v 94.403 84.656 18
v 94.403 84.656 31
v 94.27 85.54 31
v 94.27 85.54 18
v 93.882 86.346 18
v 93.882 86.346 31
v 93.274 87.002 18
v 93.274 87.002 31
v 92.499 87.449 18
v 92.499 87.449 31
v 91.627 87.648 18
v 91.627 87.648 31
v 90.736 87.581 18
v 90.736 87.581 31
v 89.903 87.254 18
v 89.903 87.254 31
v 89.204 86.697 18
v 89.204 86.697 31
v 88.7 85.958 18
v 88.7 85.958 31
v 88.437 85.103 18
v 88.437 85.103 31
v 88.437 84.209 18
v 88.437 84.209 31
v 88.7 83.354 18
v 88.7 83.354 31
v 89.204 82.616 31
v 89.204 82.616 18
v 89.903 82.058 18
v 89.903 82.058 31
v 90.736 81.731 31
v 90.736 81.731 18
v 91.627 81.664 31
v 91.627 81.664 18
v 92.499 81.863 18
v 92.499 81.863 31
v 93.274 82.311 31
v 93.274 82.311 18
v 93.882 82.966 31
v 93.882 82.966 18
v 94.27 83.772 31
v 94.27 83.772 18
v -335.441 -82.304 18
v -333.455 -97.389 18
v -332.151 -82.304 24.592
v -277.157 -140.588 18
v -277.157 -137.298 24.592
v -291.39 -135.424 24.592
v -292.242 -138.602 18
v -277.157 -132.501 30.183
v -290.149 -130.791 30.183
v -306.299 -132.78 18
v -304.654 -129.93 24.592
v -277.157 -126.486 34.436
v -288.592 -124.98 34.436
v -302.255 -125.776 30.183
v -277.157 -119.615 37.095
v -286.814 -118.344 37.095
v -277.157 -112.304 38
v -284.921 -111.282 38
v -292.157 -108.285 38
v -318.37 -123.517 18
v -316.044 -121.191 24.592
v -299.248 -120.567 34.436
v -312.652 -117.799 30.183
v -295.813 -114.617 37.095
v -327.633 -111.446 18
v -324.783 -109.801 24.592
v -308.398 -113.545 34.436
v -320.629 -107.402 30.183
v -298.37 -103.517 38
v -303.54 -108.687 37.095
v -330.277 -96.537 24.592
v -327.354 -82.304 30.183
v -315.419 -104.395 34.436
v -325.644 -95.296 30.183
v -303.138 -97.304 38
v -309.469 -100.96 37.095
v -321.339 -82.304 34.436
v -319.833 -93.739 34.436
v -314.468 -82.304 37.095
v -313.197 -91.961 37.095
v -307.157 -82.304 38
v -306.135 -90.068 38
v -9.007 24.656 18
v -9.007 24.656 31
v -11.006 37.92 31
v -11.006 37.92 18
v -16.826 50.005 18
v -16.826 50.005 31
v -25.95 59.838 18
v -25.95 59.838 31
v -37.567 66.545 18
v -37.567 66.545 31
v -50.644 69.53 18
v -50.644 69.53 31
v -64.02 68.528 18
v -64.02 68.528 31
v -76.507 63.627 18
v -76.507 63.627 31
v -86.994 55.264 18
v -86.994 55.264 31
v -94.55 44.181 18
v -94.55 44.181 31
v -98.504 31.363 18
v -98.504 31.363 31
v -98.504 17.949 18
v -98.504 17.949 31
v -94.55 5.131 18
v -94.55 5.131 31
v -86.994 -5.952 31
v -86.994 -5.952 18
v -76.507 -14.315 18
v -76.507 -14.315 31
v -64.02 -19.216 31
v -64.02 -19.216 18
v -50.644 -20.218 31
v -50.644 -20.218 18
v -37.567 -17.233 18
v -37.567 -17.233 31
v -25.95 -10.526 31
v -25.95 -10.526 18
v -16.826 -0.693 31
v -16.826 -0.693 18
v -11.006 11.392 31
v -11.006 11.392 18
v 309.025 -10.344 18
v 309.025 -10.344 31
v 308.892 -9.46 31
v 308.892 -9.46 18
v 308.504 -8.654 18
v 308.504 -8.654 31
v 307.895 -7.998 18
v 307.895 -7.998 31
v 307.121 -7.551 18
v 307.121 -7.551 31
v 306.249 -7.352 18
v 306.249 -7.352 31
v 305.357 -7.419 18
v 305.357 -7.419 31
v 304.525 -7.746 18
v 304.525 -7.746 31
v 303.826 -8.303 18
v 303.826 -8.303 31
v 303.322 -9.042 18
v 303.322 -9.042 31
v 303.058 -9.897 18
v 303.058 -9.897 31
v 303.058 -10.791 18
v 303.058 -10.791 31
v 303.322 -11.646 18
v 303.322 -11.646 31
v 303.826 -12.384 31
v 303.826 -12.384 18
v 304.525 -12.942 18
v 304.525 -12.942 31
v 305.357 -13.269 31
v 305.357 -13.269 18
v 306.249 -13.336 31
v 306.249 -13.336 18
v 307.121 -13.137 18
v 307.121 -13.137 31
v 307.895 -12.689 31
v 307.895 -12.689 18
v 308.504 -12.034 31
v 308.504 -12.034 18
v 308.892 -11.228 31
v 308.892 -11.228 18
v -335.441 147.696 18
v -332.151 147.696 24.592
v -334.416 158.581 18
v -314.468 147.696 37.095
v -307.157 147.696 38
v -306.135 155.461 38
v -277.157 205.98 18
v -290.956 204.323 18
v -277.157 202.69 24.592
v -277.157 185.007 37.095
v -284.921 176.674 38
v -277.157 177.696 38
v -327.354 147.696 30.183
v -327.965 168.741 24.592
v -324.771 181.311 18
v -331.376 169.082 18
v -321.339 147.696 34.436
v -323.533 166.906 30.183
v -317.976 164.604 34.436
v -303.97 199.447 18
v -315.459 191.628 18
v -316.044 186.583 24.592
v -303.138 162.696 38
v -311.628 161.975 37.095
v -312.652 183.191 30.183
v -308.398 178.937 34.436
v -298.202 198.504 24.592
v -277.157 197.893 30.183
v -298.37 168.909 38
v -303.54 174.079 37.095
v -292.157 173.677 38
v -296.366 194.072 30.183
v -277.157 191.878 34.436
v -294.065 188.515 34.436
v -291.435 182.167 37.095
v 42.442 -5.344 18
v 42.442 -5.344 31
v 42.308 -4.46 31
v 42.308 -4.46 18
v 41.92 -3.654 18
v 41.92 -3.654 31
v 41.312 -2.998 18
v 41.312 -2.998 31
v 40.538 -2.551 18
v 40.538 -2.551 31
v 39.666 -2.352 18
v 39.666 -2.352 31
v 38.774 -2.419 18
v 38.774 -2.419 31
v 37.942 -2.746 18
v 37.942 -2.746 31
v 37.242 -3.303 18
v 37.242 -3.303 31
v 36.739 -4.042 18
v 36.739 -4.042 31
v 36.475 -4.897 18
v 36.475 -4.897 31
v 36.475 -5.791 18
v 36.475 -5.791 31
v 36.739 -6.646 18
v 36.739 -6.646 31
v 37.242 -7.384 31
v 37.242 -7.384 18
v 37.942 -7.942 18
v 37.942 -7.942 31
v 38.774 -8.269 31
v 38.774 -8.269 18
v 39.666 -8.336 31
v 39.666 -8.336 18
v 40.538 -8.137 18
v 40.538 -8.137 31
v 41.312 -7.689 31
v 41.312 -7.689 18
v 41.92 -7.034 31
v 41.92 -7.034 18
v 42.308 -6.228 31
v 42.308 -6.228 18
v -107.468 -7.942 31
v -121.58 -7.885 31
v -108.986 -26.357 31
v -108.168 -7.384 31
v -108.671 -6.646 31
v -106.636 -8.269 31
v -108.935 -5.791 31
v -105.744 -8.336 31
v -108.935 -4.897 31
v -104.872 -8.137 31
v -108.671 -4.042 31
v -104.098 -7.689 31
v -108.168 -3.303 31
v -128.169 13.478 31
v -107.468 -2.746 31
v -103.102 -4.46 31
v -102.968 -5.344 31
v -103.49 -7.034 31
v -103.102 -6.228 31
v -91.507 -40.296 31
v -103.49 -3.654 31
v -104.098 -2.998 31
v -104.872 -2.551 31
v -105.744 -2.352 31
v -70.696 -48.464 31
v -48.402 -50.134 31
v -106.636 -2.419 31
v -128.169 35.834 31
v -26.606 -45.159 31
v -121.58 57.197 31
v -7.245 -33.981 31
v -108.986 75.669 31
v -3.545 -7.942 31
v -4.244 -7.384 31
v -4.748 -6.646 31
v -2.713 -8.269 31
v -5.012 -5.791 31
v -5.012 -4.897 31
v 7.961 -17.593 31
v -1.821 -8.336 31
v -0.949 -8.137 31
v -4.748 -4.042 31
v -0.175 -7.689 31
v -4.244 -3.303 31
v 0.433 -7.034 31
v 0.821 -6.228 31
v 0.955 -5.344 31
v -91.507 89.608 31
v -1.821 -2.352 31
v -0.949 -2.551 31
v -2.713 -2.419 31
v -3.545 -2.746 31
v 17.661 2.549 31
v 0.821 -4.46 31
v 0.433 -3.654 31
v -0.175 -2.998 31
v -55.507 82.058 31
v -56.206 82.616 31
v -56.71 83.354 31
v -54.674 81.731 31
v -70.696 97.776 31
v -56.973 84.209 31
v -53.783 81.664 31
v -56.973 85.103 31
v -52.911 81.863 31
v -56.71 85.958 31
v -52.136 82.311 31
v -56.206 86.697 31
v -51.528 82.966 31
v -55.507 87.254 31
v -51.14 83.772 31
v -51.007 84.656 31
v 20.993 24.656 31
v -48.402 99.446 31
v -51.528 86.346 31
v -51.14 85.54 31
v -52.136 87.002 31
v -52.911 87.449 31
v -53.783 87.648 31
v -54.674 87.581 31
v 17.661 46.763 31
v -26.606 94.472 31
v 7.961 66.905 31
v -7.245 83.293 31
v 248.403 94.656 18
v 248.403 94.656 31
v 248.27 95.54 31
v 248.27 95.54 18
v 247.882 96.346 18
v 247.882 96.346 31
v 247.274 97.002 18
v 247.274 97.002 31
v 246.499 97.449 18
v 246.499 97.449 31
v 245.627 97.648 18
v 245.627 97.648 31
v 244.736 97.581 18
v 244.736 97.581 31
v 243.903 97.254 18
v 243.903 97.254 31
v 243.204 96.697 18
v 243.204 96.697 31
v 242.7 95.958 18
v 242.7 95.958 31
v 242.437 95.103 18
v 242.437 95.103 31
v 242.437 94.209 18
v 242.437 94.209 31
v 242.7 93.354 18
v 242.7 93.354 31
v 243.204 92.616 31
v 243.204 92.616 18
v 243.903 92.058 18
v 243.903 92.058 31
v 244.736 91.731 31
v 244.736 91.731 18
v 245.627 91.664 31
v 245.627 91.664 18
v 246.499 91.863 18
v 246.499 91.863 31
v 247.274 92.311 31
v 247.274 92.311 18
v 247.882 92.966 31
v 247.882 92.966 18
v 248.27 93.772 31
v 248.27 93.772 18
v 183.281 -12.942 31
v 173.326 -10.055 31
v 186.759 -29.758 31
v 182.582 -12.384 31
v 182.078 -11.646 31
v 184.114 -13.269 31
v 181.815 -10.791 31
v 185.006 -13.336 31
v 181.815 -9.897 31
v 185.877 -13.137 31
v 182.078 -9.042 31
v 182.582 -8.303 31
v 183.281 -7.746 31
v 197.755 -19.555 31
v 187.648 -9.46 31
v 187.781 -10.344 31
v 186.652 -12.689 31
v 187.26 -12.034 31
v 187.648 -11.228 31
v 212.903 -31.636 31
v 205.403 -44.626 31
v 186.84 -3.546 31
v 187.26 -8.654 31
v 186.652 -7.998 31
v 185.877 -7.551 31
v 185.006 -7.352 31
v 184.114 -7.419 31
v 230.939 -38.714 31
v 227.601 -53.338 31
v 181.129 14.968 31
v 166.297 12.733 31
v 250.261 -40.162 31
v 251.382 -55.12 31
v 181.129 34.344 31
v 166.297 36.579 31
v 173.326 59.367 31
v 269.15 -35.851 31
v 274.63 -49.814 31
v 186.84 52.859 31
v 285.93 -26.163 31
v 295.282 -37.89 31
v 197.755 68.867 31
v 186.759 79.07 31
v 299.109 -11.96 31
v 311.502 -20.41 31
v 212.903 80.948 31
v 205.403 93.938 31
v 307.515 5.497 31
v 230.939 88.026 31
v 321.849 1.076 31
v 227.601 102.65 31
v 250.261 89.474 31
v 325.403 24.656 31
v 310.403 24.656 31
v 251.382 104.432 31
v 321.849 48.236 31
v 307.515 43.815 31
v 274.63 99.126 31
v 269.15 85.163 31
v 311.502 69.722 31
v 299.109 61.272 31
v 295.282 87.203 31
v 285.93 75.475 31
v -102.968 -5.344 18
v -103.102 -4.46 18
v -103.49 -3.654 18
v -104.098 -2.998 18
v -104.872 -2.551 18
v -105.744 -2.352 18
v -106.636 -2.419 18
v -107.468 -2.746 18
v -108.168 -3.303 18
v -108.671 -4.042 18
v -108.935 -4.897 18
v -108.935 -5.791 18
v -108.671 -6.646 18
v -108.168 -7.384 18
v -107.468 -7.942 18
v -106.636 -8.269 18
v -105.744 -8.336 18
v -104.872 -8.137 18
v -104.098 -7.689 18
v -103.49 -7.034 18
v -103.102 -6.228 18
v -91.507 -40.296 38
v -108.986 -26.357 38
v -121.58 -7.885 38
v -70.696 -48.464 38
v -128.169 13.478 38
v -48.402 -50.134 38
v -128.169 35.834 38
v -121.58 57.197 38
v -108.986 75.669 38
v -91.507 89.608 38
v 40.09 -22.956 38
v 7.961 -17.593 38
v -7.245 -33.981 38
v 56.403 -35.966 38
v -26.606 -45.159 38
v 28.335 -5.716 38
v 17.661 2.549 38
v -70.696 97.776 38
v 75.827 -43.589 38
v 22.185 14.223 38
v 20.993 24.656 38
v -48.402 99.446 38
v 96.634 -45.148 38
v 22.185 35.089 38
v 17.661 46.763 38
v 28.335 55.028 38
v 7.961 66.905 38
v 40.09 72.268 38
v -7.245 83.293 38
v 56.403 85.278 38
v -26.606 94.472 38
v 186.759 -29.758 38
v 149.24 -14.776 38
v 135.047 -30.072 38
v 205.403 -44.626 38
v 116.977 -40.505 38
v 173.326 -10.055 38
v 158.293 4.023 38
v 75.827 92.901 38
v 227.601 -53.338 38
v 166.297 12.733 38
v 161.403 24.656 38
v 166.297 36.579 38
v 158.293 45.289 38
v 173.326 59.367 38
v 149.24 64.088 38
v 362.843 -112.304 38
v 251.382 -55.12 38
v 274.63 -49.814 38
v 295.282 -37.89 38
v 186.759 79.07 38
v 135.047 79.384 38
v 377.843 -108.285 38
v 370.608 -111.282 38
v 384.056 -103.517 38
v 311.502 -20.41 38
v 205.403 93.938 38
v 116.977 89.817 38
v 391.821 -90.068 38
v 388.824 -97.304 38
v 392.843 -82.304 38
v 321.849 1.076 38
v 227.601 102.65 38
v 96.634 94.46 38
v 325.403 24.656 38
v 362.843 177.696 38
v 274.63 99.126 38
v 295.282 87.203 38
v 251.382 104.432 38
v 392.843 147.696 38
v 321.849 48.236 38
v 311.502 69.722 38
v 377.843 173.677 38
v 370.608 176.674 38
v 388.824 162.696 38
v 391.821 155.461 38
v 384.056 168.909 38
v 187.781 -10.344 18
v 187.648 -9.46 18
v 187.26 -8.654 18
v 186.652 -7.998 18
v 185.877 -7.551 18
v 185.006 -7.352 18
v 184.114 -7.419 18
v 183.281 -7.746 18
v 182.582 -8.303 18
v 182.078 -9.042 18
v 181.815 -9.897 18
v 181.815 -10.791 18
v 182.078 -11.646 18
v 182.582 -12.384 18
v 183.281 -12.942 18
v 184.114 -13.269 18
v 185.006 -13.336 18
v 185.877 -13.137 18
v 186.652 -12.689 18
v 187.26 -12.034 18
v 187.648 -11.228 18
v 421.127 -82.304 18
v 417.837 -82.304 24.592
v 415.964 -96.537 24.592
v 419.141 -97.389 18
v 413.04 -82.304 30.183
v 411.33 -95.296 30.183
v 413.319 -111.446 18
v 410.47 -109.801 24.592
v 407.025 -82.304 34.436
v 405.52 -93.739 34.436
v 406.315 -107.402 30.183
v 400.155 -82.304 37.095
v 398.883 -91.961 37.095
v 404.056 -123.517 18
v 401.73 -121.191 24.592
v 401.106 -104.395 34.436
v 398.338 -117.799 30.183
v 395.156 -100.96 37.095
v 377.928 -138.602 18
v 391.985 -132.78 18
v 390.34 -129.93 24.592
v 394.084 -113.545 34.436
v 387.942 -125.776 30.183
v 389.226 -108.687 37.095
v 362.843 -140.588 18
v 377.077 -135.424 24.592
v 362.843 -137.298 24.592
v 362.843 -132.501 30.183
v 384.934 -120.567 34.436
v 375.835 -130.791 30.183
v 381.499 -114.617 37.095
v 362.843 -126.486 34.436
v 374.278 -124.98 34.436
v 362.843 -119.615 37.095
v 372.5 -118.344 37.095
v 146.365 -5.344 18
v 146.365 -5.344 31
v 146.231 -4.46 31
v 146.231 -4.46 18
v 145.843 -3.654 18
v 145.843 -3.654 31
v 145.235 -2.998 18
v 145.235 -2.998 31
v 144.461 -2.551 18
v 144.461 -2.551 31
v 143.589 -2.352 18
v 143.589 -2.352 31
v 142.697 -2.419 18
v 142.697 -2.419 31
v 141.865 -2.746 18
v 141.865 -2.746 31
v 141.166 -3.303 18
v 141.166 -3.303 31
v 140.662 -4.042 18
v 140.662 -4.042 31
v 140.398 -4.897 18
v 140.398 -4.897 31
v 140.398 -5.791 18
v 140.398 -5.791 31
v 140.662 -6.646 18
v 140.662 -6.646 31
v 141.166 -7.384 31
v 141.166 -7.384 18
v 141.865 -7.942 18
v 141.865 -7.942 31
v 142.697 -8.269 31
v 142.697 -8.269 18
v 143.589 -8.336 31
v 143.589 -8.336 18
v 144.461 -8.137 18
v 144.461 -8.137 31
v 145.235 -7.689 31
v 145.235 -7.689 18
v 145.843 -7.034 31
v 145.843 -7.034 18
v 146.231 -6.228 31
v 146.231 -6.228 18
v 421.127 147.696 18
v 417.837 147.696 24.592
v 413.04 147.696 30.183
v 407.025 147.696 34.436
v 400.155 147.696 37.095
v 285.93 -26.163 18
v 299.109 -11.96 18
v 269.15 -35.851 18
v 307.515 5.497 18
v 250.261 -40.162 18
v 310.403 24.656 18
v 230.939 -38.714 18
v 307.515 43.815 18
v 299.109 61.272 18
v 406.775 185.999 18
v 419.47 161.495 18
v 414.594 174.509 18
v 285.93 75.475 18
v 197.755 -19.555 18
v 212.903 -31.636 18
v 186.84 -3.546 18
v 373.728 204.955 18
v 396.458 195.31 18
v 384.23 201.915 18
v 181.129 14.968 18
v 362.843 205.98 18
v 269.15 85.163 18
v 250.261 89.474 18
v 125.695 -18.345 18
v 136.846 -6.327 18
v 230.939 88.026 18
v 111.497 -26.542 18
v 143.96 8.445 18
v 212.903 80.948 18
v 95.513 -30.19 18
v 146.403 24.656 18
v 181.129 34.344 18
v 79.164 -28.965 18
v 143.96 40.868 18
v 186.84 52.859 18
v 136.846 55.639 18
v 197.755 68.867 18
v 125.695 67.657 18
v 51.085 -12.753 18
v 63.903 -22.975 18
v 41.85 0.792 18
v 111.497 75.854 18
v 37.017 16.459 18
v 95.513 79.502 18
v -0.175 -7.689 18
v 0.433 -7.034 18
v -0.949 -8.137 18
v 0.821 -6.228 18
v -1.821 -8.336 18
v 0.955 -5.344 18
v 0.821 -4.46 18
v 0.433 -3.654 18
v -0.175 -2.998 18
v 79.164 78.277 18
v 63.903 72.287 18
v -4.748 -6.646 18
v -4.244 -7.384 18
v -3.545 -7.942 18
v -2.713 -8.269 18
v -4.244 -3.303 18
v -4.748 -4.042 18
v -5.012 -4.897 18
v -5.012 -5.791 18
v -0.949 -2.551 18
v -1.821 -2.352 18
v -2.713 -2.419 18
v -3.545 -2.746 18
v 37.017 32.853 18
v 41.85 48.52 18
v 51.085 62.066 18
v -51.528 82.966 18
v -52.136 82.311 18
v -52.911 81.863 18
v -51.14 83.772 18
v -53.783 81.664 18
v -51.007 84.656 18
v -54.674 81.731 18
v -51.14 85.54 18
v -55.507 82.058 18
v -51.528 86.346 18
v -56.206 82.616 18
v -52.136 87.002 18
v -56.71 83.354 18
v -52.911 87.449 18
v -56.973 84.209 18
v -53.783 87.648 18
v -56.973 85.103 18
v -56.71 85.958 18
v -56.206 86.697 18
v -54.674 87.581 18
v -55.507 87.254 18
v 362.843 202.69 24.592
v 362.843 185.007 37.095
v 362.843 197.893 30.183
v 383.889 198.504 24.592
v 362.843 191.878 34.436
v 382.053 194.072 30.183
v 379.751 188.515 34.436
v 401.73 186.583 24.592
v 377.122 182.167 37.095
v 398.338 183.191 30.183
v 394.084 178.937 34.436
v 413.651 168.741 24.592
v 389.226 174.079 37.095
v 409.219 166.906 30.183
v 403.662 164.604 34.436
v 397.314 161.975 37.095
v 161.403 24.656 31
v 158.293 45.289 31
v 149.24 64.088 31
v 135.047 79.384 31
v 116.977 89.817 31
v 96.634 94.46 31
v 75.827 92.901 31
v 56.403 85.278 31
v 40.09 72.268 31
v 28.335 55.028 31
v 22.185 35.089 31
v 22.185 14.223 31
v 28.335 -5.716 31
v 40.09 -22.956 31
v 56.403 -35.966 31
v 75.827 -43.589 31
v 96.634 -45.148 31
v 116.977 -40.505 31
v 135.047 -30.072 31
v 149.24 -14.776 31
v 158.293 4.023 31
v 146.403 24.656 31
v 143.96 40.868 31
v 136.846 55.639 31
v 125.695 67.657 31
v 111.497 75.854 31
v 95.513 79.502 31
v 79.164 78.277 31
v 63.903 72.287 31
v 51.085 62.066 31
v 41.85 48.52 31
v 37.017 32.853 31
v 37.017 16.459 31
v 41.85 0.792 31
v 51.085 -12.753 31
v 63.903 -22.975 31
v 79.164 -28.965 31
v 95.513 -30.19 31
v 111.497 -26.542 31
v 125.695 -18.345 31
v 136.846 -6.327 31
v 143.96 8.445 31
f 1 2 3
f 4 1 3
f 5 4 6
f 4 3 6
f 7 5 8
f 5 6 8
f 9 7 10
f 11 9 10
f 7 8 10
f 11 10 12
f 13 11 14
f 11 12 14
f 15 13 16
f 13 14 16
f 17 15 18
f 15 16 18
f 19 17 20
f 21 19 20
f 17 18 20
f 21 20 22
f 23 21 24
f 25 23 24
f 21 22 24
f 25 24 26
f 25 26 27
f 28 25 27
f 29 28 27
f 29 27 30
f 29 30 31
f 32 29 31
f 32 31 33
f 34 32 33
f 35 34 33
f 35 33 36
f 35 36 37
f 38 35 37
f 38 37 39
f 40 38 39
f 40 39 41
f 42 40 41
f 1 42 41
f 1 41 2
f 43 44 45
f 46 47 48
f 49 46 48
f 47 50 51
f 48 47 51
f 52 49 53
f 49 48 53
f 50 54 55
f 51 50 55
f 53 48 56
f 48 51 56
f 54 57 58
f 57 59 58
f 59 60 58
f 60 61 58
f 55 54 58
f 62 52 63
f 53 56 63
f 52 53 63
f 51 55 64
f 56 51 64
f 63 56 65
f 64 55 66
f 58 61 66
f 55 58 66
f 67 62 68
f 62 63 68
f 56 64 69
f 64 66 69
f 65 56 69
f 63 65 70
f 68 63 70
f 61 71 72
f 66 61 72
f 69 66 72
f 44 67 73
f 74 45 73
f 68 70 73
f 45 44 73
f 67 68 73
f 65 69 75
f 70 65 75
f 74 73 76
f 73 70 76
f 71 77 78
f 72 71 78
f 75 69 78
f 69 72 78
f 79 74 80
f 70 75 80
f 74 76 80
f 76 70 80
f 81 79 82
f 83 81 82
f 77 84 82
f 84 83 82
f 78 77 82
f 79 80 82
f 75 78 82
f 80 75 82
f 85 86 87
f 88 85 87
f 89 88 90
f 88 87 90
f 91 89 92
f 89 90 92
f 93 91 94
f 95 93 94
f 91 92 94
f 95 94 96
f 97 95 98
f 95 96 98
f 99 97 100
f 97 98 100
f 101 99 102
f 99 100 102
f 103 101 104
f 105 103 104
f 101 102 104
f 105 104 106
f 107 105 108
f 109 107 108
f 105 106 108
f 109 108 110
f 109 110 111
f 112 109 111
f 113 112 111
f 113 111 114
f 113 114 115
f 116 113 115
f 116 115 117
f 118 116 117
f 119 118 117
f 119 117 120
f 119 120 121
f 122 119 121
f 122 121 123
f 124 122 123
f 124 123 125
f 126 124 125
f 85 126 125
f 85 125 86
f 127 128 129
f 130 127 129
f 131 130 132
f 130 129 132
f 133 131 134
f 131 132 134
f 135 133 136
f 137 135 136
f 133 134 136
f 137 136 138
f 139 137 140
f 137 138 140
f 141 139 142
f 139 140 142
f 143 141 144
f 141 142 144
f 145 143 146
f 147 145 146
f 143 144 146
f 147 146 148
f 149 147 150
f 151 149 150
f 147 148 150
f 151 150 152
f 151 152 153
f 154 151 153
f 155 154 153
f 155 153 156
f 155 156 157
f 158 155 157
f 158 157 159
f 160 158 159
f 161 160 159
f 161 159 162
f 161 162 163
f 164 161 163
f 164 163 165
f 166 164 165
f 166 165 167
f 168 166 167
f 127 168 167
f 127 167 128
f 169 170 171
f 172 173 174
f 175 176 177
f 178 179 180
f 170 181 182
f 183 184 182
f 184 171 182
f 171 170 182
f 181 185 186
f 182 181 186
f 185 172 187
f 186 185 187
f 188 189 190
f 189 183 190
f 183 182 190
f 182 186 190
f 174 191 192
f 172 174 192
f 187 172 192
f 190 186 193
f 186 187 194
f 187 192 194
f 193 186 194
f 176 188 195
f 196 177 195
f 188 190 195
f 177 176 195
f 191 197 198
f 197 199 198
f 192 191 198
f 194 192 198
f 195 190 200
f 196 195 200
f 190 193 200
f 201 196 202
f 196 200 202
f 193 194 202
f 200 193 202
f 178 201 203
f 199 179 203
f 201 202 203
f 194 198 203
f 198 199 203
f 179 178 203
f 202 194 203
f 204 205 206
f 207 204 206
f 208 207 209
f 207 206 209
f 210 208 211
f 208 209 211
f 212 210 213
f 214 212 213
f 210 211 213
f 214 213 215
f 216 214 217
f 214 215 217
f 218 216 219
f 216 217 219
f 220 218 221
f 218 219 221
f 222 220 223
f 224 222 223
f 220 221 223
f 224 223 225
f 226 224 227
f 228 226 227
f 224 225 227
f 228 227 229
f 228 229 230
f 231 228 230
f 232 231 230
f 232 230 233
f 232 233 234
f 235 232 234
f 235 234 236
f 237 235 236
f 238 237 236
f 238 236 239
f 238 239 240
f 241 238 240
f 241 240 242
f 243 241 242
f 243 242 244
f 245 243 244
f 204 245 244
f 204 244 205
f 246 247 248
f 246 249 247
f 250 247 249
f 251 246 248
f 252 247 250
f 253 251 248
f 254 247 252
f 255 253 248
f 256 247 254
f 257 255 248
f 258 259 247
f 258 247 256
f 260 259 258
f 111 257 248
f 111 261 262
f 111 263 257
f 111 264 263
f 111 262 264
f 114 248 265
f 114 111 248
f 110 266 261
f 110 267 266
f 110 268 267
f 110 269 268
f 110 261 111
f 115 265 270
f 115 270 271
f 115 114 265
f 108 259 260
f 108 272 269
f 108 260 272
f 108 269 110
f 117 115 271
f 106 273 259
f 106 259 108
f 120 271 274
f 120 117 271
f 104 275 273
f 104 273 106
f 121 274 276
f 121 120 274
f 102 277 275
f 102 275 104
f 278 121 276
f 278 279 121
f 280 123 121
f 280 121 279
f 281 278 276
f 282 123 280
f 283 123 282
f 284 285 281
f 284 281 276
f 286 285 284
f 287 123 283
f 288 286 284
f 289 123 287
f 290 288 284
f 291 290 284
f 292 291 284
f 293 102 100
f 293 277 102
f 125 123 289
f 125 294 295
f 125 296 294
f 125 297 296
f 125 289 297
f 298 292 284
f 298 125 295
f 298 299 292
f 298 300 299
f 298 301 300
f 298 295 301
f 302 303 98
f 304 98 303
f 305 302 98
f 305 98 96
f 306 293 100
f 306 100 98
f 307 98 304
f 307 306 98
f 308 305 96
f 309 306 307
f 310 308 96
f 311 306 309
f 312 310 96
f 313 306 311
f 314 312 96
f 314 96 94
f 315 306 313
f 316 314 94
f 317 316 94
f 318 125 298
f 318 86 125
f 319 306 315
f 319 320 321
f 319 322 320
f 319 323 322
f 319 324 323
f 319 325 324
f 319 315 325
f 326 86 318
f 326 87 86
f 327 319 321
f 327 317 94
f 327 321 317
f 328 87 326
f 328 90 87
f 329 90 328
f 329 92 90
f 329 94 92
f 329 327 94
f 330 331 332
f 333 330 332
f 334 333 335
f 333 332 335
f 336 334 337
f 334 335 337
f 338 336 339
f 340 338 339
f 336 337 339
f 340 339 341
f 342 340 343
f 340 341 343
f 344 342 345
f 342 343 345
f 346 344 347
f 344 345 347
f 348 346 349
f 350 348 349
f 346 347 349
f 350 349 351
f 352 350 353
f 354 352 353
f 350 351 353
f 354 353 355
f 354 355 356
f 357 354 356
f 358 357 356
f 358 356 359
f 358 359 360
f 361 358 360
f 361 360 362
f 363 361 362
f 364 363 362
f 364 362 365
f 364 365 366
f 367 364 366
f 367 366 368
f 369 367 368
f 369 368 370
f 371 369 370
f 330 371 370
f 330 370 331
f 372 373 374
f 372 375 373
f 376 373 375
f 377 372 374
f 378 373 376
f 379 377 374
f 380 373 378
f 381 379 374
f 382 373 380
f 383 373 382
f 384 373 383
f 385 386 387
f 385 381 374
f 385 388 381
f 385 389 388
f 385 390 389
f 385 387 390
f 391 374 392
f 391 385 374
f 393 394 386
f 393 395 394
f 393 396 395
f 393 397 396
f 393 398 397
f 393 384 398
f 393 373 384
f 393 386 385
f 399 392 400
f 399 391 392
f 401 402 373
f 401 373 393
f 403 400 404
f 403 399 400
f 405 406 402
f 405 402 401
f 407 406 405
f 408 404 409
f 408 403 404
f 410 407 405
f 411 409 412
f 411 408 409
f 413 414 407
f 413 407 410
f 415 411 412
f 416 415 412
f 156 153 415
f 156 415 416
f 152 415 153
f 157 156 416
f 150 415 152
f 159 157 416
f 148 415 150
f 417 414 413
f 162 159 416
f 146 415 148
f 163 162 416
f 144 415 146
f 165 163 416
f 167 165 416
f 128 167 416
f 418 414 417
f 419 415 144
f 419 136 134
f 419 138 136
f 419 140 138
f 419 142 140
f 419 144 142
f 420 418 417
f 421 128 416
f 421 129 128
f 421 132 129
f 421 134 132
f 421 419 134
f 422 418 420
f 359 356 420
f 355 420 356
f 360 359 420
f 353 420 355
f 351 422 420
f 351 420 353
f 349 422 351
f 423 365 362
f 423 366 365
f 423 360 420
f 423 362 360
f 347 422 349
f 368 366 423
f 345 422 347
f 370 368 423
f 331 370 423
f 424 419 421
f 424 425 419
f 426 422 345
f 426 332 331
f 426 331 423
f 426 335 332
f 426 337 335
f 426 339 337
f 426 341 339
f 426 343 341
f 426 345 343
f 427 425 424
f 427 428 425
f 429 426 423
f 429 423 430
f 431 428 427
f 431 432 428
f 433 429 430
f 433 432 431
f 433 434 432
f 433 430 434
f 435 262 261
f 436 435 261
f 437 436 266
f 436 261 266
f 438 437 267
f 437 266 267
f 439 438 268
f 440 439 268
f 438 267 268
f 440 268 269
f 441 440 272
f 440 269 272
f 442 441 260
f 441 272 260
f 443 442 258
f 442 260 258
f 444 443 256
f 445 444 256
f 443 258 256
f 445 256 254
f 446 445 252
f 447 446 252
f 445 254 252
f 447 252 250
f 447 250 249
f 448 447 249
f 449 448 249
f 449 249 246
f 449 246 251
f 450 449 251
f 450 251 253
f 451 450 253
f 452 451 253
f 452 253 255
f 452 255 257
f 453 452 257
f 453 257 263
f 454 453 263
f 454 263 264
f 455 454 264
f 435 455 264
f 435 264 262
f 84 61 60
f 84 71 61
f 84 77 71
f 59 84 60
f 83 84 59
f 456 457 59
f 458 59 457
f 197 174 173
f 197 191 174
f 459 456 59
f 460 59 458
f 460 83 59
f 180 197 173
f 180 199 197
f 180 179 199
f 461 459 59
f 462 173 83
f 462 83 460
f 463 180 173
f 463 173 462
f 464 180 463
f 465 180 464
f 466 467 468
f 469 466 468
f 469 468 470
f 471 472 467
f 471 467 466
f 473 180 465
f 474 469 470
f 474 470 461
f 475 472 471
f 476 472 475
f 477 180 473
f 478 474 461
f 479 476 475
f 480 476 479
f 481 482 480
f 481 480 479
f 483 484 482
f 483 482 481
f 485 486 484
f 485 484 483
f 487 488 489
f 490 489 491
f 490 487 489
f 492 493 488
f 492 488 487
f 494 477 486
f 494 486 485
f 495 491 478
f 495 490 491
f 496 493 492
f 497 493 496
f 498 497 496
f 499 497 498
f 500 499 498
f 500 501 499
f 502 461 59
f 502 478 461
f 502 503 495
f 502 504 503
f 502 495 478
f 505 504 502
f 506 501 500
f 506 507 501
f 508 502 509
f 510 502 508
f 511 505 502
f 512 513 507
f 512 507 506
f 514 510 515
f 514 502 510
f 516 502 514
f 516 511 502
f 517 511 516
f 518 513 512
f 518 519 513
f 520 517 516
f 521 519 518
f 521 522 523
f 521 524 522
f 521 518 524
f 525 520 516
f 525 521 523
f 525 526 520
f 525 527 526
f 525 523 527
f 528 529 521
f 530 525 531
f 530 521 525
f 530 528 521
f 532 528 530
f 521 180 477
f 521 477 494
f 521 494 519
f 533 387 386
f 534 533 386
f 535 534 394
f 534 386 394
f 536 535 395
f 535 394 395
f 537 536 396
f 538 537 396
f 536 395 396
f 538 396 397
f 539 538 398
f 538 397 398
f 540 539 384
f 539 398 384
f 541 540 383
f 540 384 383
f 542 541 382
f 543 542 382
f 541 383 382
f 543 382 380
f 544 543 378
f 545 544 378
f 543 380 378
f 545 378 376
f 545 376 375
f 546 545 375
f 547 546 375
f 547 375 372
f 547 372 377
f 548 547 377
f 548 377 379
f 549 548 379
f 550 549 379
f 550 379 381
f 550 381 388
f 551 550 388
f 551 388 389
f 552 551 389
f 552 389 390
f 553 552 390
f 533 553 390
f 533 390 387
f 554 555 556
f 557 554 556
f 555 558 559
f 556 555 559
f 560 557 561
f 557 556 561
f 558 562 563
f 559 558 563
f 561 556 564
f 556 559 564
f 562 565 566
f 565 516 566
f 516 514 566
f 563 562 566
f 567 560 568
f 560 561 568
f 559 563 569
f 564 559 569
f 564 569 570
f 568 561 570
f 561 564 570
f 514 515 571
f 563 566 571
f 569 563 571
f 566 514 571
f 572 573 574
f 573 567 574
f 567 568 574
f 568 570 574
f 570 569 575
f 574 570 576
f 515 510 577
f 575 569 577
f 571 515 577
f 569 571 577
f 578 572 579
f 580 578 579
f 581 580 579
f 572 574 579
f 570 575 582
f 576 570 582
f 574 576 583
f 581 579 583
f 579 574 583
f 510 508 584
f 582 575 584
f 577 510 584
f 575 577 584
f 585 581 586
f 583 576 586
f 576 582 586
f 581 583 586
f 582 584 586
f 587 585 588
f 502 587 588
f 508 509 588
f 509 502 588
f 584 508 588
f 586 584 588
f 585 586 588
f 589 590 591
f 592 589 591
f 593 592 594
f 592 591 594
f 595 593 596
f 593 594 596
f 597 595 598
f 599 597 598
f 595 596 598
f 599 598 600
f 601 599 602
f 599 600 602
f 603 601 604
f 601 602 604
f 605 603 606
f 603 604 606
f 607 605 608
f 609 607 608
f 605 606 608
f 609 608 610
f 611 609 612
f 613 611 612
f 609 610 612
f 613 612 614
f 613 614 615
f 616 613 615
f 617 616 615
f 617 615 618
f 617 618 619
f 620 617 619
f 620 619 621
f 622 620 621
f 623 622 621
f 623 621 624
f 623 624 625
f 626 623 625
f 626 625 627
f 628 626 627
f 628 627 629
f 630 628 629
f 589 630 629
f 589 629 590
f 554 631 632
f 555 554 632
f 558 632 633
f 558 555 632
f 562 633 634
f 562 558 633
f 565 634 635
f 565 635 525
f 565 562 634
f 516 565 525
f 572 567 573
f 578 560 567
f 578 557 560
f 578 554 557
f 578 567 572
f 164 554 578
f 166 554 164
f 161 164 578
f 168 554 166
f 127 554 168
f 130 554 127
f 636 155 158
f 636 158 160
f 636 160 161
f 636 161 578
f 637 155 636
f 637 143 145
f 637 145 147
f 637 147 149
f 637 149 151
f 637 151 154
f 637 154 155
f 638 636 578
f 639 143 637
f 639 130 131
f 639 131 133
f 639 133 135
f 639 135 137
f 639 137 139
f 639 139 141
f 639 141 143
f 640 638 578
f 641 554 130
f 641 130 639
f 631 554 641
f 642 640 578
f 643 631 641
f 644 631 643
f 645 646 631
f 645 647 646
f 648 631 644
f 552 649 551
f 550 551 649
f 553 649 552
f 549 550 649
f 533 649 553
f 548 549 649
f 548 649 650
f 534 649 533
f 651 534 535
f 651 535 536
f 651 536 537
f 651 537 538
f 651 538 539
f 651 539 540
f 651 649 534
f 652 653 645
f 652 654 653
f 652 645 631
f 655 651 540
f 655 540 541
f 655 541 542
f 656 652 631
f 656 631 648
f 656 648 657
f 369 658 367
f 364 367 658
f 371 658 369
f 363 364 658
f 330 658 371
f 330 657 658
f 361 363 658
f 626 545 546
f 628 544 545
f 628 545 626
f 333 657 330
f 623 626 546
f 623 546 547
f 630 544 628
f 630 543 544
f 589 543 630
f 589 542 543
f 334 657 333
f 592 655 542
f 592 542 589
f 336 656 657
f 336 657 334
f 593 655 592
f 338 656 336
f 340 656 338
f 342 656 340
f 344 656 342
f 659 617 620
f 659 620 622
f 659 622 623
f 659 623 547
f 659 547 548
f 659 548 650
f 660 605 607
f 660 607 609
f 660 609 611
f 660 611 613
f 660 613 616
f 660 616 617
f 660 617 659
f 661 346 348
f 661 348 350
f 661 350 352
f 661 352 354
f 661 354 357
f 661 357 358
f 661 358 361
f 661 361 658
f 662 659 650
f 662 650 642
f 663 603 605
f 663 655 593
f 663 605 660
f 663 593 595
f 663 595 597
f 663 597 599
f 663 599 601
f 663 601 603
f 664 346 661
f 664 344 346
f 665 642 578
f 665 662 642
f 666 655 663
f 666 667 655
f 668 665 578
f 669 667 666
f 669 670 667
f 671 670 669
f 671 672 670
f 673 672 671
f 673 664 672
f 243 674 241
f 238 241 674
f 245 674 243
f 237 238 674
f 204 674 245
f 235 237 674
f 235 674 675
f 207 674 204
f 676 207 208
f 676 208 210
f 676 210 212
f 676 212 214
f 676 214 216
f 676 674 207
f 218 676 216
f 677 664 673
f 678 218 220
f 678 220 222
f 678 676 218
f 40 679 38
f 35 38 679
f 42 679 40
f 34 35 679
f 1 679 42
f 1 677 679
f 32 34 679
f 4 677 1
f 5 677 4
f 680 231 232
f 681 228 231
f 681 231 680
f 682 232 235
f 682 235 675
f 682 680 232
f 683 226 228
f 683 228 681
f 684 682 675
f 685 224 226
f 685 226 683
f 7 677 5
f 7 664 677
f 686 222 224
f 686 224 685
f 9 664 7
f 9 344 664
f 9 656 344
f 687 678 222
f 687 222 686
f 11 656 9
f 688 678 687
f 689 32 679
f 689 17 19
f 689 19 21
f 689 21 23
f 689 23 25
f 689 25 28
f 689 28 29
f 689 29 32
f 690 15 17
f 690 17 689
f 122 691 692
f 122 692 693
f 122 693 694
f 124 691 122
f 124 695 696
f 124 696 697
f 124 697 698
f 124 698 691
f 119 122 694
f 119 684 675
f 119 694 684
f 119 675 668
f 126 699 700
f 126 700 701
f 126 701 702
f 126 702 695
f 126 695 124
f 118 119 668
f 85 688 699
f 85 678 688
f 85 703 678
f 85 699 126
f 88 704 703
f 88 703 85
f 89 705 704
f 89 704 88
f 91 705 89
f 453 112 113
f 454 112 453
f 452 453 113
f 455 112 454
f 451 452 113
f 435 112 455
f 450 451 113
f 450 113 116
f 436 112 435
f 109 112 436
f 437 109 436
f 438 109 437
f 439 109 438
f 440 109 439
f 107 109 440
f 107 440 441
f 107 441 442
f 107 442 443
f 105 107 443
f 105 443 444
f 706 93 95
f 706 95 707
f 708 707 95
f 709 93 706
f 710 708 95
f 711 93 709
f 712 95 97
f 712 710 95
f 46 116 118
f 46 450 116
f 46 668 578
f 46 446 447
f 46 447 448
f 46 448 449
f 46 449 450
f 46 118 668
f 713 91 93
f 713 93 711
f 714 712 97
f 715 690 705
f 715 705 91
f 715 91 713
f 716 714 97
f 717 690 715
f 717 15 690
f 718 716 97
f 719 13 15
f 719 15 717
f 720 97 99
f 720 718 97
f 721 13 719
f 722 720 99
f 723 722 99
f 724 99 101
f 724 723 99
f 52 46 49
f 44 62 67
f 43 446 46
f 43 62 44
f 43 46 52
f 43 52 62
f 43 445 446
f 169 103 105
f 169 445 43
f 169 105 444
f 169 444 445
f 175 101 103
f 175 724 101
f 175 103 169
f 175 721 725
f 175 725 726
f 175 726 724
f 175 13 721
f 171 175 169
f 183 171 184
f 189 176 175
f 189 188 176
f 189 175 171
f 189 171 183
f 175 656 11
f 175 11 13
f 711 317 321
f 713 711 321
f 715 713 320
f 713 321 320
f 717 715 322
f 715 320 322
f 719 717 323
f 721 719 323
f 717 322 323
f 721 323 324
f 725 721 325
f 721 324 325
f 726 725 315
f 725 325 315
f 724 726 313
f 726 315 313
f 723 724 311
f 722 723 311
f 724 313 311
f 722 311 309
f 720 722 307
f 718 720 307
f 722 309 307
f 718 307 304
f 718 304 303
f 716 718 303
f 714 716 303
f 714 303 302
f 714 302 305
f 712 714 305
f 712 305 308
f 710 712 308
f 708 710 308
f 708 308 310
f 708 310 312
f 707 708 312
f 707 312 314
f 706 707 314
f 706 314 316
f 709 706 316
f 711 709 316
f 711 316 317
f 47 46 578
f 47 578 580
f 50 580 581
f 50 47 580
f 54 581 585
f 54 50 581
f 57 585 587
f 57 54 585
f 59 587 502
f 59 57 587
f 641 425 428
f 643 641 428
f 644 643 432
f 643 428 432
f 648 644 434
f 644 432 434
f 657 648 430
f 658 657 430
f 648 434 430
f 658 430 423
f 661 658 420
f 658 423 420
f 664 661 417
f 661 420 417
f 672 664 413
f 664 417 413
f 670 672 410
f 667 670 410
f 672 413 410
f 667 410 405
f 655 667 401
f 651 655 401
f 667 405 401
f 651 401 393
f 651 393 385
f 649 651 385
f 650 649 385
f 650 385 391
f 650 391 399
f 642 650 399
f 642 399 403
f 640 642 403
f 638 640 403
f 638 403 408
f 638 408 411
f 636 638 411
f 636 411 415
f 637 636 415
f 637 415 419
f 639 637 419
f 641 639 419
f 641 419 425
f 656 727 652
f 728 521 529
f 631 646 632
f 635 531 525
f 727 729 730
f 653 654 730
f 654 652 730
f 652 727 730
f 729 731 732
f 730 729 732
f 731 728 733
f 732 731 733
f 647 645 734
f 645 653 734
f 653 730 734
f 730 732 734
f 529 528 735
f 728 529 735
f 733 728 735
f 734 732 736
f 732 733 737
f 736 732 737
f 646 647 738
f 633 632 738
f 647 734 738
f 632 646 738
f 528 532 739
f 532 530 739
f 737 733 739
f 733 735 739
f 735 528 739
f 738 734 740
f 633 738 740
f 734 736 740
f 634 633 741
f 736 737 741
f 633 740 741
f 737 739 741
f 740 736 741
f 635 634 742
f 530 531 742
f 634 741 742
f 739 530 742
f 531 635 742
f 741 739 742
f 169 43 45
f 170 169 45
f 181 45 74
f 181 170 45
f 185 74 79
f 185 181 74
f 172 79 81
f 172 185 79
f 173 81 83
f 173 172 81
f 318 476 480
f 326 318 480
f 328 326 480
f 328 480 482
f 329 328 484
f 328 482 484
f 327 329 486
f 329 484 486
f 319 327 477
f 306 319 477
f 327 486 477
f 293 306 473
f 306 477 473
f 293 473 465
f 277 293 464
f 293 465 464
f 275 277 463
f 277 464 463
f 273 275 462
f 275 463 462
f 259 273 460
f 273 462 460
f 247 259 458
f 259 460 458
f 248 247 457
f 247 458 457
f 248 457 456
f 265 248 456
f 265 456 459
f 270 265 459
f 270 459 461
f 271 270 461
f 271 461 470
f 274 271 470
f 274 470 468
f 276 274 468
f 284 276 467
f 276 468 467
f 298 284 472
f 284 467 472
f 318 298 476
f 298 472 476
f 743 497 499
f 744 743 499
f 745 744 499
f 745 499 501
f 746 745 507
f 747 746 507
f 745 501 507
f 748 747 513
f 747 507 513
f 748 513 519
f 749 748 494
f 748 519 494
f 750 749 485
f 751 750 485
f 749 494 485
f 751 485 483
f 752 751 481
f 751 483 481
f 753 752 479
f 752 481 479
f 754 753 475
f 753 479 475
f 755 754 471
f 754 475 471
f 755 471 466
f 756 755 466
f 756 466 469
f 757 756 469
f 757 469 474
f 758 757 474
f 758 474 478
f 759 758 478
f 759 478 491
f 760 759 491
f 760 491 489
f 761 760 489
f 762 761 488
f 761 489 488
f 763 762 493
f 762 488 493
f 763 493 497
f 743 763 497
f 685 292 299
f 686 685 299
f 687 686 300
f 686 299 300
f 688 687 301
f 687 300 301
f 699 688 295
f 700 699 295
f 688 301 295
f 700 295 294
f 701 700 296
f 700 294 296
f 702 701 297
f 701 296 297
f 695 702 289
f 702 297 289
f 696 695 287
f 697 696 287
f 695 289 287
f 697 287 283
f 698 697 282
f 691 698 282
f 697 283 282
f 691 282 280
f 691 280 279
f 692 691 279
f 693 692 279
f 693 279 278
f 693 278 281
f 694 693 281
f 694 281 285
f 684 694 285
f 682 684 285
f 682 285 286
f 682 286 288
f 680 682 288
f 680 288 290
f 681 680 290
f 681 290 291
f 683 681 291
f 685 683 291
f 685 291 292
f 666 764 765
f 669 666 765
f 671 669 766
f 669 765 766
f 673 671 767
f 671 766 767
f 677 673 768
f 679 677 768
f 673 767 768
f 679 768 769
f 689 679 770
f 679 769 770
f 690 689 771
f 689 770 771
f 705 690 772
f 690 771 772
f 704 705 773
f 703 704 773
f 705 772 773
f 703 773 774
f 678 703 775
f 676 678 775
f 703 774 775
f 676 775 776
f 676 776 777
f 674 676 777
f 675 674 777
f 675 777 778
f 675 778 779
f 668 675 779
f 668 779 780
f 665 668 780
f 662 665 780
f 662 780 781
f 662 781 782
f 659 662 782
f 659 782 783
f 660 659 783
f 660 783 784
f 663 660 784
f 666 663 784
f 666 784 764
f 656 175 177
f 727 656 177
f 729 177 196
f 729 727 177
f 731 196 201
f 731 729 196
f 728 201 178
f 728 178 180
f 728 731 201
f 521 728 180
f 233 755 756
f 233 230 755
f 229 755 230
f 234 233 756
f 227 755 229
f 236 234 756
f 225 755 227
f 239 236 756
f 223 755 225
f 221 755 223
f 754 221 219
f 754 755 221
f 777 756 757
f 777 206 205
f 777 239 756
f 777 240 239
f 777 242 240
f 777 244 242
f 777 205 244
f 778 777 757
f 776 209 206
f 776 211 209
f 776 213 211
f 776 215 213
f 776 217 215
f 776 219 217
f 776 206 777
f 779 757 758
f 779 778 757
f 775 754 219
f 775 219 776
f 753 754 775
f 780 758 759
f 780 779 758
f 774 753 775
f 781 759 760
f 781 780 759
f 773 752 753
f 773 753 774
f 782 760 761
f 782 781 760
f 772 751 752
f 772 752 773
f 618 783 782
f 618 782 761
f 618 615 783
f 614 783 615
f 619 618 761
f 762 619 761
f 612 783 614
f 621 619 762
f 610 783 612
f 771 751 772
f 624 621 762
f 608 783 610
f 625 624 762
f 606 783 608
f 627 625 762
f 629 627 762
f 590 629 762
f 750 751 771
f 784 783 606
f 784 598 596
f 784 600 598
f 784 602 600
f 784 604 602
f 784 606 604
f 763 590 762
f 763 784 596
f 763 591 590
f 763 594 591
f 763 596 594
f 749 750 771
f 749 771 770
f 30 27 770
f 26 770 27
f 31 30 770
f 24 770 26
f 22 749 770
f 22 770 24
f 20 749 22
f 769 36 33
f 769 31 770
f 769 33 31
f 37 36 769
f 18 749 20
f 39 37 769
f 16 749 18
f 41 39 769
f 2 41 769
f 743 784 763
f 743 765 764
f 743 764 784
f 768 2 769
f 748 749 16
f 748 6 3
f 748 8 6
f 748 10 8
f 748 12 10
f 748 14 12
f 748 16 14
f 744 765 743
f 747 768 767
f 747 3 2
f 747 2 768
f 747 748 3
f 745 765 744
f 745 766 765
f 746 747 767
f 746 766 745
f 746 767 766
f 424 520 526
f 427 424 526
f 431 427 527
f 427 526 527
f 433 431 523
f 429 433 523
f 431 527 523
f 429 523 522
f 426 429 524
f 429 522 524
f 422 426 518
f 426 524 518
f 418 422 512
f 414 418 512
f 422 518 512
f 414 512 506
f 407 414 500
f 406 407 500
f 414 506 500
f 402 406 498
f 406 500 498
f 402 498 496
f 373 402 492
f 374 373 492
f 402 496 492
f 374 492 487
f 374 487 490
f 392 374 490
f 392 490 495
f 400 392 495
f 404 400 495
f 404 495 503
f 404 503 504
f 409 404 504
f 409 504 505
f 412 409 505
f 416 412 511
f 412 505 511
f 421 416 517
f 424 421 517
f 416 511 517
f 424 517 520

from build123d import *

# Parameters (mm, degrees)
SKETCH1_W           = 760
SKETCH1_H           = 350
BOSS_EXTRUDE1_DEPTH = 38
SKETCH2_R           = 65
SKETCH2_R_2         = 55
SKETCH2_R_3         = 45
CUT_EXTRUDE1_DEPTH  = 39
SKETCH4_R           = 75
CUT_EXTRUDE2_DEPTH  = 7
SKETCH5_R           = 70
CUT_EXTRUDE3_DEPTH  = 7
SKETCH12_R          = 3
CUT_EXTRUDE6_DEPTH  = 39
SKETCH15_OUTSIDE_W  = 929.516
SKETCH15_OUTSIDE_H  = 519.516
CUT_EXTRUDE7_DEPTH  = 39
FILLET1_R           = 30
SKETCH16_W          = 760
SKETCH16_H          = 350
CUT_EXTRUDE8_DEPTH  = 18
SKETCH17_R          = 80
SKETCH17_R_2        = 3
CUT_EXTRUDE9_DEPTH  = 7
SKETCH18_R          = 3
CUT_EXTRUDE10_DEPTH = 20


with BuildPart() as part:
    # Sketch1 → Boss-Extrude1 (new body)
    with BuildSketch(Plane.XY):
        with Locations((42.843137255, 32.696078431)):
            Rectangle(SKETCH1_W, SKETCH1_H)
    extrude(amount=BOSS_EXTRUDE1_DEPTH)

    # Sketch2 → Cut-Extrude1 (cut, through all)
    with BuildSketch(Plane.XY.offset(38)):
        with Locations((245.403137255, 24.656078431)):
            Circle(SKETCH2_R)
        with Locations((91.403137255, 24.656078431)):
            Circle(SKETCH2_R_2)
        with Locations((-54.006862745, 24.656078431)):
            Circle(SKETCH2_R_3)
    extrude(amount=-CUT_EXTRUDE1_DEPTH, mode=Mode.SUBTRACT)

    # Sketch4 → Cut-Extrude2 (cut)
    with BuildSketch(Plane.XY.offset(38)):
        with Locations((-54.006862745, 24.656078431)):
            Circle(SKETCH4_R)
    extrude(amount=-CUT_EXTRUDE2_DEPTH, mode=Mode.SUBTRACT)

    # Sketch5 → Cut-Extrude3 (cut)
    with BuildSketch(Plane.XY.offset(38)):
        with Locations((91.403137255, 24.656078431)):
            Circle(SKETCH5_R)
    extrude(amount=-CUT_EXTRUDE3_DEPTH, mode=Mode.SUBTRACT)

    # Sketch12 → Cut-Extrude6 (cut, through all)
    with BuildSketch(Plane.XY.offset(38)):
        with Locations((-54.006862745, 84.656078431)):
            Circle(SKETCH12_R)
        with Locations((-2.045338518, -5.343921569)):
            Circle(SKETCH12_R)
        with Locations((-105.968386972, -5.343921569)):
            Circle(SKETCH12_R)
        with Locations((91.403137255, 84.656078431)):
            Circle(SKETCH12_R)
        with Locations((143.364661482, -5.343921569)):
            Circle(SKETCH12_R)
        with Locations((39.441613028, -5.343921569)):
            Circle(SKETCH12_R)
    extrude(amount=-CUT_EXTRUDE6_DEPTH, mode=Mode.SUBTRACT)

    # Sketch15 outside → Cut-Extrude7 (cut, through all)
    with BuildSketch(Plane.XY.offset(38)):
        with Locations((42.843, 32.696)):
            Rectangle(SKETCH15_OUTSIDE_W, SKETCH15_OUTSIDE_H)
        with BuildLine():
            Line((-277.156862745, 207.696078431), (362.843137255, 207.696078431))
            ThreePointArc((362.843137255, 207.696078431), (405.269544126, 190.122485303), (422.843137255, 147.696078431))
            Line((422.843137255, 147.696078431), (422.843137255, -82.303921569))
            ThreePointArc((422.843137255, -82.303921569), (405.269544126, -124.73032844), (362.843137255, -142.303921569))
            Line((362.843137255, -142.303921569), (-277.156862745, -142.303921569))
            ThreePointArc((-277.156862745, -142.303921569), (-319.583269616, -124.73032844), (-337.156862745, -82.303921569))
            Line((-337.156862745, -82.303921569), (-337.156862745, 147.696078431))
            ThreePointArc((-337.156862745, 147.696078431), (-319.583269616, 190.122485303), (-277.156862745, 207.696078431))
        make_face(mode=Mode.SUBTRACT)
    extrude(amount=-CUT_EXTRUDE7_DEPTH, mode=Mode.SUBTRACT)

    # Fillet1
    fillet1_edges = [part.edges().sort_by_distance(p)[0] for p in [
        (-337.156862745, 32.696078431, 38),
        (42.843137255, -142.303921569, 38),
        (422.843137255, 32.696078431, 38),
        (42.843137255, 207.696078431, 38),
        (405.269544126, -124.73032844, 38),
        (-319.583269616, -124.73032844, 38),
        (-319.583269616, 190.122485303, 38),
        (405.269544126, 190.122485303, 38),
    ]]
    fillet(fillet1_edges, radius=FILLET1_R)

    # Sketch16 → Cut-Extrude8 (cut)
    with BuildSketch(Plane(origin=(0, 0, 0), x_dir=(-1, 0, 0), z_dir=(0, 0, -1))):
        with Locations((-42.843137255, 32.696078431)):
            Rectangle(SKETCH16_W, SKETCH16_H)
    extrude(amount=-CUT_EXTRUDE8_DEPTH, mode=Mode.SUBTRACT)

    # Sketch17 → Cut-Extrude9 (cut)
    with BuildSketch(Plane.XY.offset(38)):
        with Locations((245.403137255, 24.656078431)):
            Circle(SKETCH17_R)
        with Locations((245.403137255, 94.656078431)):
            Circle(SKETCH17_R_2, mode=Mode.SUBTRACT)
        with Locations((306.02491552, -10.343921569)):
            Circle(SKETCH17_R_2, mode=Mode.SUBTRACT)
        with Locations((184.78135899, -10.343921569)):
            Circle(SKETCH17_R_2, mode=Mode.SUBTRACT)
    extrude(amount=-CUT_EXTRUDE9_DEPTH, mode=Mode.SUBTRACT)

    # Sketch18 → Cut-Extrude10 (cut)
    with BuildSketch(Plane.XY.offset(38)):
        with Locations((245.403137255, 94.656078431)):
            Circle(SKETCH18_R)
        with Locations((184.78135899, -10.343921569)):
            Circle(SKETCH18_R)
        with Locations((306.02491552, -10.343921569)):
            Circle(SKETCH18_R)
    extrude(amount=-CUT_EXTRUDE10_DEPTH, mode=Mode.SUBTRACT)


solid = part.part
